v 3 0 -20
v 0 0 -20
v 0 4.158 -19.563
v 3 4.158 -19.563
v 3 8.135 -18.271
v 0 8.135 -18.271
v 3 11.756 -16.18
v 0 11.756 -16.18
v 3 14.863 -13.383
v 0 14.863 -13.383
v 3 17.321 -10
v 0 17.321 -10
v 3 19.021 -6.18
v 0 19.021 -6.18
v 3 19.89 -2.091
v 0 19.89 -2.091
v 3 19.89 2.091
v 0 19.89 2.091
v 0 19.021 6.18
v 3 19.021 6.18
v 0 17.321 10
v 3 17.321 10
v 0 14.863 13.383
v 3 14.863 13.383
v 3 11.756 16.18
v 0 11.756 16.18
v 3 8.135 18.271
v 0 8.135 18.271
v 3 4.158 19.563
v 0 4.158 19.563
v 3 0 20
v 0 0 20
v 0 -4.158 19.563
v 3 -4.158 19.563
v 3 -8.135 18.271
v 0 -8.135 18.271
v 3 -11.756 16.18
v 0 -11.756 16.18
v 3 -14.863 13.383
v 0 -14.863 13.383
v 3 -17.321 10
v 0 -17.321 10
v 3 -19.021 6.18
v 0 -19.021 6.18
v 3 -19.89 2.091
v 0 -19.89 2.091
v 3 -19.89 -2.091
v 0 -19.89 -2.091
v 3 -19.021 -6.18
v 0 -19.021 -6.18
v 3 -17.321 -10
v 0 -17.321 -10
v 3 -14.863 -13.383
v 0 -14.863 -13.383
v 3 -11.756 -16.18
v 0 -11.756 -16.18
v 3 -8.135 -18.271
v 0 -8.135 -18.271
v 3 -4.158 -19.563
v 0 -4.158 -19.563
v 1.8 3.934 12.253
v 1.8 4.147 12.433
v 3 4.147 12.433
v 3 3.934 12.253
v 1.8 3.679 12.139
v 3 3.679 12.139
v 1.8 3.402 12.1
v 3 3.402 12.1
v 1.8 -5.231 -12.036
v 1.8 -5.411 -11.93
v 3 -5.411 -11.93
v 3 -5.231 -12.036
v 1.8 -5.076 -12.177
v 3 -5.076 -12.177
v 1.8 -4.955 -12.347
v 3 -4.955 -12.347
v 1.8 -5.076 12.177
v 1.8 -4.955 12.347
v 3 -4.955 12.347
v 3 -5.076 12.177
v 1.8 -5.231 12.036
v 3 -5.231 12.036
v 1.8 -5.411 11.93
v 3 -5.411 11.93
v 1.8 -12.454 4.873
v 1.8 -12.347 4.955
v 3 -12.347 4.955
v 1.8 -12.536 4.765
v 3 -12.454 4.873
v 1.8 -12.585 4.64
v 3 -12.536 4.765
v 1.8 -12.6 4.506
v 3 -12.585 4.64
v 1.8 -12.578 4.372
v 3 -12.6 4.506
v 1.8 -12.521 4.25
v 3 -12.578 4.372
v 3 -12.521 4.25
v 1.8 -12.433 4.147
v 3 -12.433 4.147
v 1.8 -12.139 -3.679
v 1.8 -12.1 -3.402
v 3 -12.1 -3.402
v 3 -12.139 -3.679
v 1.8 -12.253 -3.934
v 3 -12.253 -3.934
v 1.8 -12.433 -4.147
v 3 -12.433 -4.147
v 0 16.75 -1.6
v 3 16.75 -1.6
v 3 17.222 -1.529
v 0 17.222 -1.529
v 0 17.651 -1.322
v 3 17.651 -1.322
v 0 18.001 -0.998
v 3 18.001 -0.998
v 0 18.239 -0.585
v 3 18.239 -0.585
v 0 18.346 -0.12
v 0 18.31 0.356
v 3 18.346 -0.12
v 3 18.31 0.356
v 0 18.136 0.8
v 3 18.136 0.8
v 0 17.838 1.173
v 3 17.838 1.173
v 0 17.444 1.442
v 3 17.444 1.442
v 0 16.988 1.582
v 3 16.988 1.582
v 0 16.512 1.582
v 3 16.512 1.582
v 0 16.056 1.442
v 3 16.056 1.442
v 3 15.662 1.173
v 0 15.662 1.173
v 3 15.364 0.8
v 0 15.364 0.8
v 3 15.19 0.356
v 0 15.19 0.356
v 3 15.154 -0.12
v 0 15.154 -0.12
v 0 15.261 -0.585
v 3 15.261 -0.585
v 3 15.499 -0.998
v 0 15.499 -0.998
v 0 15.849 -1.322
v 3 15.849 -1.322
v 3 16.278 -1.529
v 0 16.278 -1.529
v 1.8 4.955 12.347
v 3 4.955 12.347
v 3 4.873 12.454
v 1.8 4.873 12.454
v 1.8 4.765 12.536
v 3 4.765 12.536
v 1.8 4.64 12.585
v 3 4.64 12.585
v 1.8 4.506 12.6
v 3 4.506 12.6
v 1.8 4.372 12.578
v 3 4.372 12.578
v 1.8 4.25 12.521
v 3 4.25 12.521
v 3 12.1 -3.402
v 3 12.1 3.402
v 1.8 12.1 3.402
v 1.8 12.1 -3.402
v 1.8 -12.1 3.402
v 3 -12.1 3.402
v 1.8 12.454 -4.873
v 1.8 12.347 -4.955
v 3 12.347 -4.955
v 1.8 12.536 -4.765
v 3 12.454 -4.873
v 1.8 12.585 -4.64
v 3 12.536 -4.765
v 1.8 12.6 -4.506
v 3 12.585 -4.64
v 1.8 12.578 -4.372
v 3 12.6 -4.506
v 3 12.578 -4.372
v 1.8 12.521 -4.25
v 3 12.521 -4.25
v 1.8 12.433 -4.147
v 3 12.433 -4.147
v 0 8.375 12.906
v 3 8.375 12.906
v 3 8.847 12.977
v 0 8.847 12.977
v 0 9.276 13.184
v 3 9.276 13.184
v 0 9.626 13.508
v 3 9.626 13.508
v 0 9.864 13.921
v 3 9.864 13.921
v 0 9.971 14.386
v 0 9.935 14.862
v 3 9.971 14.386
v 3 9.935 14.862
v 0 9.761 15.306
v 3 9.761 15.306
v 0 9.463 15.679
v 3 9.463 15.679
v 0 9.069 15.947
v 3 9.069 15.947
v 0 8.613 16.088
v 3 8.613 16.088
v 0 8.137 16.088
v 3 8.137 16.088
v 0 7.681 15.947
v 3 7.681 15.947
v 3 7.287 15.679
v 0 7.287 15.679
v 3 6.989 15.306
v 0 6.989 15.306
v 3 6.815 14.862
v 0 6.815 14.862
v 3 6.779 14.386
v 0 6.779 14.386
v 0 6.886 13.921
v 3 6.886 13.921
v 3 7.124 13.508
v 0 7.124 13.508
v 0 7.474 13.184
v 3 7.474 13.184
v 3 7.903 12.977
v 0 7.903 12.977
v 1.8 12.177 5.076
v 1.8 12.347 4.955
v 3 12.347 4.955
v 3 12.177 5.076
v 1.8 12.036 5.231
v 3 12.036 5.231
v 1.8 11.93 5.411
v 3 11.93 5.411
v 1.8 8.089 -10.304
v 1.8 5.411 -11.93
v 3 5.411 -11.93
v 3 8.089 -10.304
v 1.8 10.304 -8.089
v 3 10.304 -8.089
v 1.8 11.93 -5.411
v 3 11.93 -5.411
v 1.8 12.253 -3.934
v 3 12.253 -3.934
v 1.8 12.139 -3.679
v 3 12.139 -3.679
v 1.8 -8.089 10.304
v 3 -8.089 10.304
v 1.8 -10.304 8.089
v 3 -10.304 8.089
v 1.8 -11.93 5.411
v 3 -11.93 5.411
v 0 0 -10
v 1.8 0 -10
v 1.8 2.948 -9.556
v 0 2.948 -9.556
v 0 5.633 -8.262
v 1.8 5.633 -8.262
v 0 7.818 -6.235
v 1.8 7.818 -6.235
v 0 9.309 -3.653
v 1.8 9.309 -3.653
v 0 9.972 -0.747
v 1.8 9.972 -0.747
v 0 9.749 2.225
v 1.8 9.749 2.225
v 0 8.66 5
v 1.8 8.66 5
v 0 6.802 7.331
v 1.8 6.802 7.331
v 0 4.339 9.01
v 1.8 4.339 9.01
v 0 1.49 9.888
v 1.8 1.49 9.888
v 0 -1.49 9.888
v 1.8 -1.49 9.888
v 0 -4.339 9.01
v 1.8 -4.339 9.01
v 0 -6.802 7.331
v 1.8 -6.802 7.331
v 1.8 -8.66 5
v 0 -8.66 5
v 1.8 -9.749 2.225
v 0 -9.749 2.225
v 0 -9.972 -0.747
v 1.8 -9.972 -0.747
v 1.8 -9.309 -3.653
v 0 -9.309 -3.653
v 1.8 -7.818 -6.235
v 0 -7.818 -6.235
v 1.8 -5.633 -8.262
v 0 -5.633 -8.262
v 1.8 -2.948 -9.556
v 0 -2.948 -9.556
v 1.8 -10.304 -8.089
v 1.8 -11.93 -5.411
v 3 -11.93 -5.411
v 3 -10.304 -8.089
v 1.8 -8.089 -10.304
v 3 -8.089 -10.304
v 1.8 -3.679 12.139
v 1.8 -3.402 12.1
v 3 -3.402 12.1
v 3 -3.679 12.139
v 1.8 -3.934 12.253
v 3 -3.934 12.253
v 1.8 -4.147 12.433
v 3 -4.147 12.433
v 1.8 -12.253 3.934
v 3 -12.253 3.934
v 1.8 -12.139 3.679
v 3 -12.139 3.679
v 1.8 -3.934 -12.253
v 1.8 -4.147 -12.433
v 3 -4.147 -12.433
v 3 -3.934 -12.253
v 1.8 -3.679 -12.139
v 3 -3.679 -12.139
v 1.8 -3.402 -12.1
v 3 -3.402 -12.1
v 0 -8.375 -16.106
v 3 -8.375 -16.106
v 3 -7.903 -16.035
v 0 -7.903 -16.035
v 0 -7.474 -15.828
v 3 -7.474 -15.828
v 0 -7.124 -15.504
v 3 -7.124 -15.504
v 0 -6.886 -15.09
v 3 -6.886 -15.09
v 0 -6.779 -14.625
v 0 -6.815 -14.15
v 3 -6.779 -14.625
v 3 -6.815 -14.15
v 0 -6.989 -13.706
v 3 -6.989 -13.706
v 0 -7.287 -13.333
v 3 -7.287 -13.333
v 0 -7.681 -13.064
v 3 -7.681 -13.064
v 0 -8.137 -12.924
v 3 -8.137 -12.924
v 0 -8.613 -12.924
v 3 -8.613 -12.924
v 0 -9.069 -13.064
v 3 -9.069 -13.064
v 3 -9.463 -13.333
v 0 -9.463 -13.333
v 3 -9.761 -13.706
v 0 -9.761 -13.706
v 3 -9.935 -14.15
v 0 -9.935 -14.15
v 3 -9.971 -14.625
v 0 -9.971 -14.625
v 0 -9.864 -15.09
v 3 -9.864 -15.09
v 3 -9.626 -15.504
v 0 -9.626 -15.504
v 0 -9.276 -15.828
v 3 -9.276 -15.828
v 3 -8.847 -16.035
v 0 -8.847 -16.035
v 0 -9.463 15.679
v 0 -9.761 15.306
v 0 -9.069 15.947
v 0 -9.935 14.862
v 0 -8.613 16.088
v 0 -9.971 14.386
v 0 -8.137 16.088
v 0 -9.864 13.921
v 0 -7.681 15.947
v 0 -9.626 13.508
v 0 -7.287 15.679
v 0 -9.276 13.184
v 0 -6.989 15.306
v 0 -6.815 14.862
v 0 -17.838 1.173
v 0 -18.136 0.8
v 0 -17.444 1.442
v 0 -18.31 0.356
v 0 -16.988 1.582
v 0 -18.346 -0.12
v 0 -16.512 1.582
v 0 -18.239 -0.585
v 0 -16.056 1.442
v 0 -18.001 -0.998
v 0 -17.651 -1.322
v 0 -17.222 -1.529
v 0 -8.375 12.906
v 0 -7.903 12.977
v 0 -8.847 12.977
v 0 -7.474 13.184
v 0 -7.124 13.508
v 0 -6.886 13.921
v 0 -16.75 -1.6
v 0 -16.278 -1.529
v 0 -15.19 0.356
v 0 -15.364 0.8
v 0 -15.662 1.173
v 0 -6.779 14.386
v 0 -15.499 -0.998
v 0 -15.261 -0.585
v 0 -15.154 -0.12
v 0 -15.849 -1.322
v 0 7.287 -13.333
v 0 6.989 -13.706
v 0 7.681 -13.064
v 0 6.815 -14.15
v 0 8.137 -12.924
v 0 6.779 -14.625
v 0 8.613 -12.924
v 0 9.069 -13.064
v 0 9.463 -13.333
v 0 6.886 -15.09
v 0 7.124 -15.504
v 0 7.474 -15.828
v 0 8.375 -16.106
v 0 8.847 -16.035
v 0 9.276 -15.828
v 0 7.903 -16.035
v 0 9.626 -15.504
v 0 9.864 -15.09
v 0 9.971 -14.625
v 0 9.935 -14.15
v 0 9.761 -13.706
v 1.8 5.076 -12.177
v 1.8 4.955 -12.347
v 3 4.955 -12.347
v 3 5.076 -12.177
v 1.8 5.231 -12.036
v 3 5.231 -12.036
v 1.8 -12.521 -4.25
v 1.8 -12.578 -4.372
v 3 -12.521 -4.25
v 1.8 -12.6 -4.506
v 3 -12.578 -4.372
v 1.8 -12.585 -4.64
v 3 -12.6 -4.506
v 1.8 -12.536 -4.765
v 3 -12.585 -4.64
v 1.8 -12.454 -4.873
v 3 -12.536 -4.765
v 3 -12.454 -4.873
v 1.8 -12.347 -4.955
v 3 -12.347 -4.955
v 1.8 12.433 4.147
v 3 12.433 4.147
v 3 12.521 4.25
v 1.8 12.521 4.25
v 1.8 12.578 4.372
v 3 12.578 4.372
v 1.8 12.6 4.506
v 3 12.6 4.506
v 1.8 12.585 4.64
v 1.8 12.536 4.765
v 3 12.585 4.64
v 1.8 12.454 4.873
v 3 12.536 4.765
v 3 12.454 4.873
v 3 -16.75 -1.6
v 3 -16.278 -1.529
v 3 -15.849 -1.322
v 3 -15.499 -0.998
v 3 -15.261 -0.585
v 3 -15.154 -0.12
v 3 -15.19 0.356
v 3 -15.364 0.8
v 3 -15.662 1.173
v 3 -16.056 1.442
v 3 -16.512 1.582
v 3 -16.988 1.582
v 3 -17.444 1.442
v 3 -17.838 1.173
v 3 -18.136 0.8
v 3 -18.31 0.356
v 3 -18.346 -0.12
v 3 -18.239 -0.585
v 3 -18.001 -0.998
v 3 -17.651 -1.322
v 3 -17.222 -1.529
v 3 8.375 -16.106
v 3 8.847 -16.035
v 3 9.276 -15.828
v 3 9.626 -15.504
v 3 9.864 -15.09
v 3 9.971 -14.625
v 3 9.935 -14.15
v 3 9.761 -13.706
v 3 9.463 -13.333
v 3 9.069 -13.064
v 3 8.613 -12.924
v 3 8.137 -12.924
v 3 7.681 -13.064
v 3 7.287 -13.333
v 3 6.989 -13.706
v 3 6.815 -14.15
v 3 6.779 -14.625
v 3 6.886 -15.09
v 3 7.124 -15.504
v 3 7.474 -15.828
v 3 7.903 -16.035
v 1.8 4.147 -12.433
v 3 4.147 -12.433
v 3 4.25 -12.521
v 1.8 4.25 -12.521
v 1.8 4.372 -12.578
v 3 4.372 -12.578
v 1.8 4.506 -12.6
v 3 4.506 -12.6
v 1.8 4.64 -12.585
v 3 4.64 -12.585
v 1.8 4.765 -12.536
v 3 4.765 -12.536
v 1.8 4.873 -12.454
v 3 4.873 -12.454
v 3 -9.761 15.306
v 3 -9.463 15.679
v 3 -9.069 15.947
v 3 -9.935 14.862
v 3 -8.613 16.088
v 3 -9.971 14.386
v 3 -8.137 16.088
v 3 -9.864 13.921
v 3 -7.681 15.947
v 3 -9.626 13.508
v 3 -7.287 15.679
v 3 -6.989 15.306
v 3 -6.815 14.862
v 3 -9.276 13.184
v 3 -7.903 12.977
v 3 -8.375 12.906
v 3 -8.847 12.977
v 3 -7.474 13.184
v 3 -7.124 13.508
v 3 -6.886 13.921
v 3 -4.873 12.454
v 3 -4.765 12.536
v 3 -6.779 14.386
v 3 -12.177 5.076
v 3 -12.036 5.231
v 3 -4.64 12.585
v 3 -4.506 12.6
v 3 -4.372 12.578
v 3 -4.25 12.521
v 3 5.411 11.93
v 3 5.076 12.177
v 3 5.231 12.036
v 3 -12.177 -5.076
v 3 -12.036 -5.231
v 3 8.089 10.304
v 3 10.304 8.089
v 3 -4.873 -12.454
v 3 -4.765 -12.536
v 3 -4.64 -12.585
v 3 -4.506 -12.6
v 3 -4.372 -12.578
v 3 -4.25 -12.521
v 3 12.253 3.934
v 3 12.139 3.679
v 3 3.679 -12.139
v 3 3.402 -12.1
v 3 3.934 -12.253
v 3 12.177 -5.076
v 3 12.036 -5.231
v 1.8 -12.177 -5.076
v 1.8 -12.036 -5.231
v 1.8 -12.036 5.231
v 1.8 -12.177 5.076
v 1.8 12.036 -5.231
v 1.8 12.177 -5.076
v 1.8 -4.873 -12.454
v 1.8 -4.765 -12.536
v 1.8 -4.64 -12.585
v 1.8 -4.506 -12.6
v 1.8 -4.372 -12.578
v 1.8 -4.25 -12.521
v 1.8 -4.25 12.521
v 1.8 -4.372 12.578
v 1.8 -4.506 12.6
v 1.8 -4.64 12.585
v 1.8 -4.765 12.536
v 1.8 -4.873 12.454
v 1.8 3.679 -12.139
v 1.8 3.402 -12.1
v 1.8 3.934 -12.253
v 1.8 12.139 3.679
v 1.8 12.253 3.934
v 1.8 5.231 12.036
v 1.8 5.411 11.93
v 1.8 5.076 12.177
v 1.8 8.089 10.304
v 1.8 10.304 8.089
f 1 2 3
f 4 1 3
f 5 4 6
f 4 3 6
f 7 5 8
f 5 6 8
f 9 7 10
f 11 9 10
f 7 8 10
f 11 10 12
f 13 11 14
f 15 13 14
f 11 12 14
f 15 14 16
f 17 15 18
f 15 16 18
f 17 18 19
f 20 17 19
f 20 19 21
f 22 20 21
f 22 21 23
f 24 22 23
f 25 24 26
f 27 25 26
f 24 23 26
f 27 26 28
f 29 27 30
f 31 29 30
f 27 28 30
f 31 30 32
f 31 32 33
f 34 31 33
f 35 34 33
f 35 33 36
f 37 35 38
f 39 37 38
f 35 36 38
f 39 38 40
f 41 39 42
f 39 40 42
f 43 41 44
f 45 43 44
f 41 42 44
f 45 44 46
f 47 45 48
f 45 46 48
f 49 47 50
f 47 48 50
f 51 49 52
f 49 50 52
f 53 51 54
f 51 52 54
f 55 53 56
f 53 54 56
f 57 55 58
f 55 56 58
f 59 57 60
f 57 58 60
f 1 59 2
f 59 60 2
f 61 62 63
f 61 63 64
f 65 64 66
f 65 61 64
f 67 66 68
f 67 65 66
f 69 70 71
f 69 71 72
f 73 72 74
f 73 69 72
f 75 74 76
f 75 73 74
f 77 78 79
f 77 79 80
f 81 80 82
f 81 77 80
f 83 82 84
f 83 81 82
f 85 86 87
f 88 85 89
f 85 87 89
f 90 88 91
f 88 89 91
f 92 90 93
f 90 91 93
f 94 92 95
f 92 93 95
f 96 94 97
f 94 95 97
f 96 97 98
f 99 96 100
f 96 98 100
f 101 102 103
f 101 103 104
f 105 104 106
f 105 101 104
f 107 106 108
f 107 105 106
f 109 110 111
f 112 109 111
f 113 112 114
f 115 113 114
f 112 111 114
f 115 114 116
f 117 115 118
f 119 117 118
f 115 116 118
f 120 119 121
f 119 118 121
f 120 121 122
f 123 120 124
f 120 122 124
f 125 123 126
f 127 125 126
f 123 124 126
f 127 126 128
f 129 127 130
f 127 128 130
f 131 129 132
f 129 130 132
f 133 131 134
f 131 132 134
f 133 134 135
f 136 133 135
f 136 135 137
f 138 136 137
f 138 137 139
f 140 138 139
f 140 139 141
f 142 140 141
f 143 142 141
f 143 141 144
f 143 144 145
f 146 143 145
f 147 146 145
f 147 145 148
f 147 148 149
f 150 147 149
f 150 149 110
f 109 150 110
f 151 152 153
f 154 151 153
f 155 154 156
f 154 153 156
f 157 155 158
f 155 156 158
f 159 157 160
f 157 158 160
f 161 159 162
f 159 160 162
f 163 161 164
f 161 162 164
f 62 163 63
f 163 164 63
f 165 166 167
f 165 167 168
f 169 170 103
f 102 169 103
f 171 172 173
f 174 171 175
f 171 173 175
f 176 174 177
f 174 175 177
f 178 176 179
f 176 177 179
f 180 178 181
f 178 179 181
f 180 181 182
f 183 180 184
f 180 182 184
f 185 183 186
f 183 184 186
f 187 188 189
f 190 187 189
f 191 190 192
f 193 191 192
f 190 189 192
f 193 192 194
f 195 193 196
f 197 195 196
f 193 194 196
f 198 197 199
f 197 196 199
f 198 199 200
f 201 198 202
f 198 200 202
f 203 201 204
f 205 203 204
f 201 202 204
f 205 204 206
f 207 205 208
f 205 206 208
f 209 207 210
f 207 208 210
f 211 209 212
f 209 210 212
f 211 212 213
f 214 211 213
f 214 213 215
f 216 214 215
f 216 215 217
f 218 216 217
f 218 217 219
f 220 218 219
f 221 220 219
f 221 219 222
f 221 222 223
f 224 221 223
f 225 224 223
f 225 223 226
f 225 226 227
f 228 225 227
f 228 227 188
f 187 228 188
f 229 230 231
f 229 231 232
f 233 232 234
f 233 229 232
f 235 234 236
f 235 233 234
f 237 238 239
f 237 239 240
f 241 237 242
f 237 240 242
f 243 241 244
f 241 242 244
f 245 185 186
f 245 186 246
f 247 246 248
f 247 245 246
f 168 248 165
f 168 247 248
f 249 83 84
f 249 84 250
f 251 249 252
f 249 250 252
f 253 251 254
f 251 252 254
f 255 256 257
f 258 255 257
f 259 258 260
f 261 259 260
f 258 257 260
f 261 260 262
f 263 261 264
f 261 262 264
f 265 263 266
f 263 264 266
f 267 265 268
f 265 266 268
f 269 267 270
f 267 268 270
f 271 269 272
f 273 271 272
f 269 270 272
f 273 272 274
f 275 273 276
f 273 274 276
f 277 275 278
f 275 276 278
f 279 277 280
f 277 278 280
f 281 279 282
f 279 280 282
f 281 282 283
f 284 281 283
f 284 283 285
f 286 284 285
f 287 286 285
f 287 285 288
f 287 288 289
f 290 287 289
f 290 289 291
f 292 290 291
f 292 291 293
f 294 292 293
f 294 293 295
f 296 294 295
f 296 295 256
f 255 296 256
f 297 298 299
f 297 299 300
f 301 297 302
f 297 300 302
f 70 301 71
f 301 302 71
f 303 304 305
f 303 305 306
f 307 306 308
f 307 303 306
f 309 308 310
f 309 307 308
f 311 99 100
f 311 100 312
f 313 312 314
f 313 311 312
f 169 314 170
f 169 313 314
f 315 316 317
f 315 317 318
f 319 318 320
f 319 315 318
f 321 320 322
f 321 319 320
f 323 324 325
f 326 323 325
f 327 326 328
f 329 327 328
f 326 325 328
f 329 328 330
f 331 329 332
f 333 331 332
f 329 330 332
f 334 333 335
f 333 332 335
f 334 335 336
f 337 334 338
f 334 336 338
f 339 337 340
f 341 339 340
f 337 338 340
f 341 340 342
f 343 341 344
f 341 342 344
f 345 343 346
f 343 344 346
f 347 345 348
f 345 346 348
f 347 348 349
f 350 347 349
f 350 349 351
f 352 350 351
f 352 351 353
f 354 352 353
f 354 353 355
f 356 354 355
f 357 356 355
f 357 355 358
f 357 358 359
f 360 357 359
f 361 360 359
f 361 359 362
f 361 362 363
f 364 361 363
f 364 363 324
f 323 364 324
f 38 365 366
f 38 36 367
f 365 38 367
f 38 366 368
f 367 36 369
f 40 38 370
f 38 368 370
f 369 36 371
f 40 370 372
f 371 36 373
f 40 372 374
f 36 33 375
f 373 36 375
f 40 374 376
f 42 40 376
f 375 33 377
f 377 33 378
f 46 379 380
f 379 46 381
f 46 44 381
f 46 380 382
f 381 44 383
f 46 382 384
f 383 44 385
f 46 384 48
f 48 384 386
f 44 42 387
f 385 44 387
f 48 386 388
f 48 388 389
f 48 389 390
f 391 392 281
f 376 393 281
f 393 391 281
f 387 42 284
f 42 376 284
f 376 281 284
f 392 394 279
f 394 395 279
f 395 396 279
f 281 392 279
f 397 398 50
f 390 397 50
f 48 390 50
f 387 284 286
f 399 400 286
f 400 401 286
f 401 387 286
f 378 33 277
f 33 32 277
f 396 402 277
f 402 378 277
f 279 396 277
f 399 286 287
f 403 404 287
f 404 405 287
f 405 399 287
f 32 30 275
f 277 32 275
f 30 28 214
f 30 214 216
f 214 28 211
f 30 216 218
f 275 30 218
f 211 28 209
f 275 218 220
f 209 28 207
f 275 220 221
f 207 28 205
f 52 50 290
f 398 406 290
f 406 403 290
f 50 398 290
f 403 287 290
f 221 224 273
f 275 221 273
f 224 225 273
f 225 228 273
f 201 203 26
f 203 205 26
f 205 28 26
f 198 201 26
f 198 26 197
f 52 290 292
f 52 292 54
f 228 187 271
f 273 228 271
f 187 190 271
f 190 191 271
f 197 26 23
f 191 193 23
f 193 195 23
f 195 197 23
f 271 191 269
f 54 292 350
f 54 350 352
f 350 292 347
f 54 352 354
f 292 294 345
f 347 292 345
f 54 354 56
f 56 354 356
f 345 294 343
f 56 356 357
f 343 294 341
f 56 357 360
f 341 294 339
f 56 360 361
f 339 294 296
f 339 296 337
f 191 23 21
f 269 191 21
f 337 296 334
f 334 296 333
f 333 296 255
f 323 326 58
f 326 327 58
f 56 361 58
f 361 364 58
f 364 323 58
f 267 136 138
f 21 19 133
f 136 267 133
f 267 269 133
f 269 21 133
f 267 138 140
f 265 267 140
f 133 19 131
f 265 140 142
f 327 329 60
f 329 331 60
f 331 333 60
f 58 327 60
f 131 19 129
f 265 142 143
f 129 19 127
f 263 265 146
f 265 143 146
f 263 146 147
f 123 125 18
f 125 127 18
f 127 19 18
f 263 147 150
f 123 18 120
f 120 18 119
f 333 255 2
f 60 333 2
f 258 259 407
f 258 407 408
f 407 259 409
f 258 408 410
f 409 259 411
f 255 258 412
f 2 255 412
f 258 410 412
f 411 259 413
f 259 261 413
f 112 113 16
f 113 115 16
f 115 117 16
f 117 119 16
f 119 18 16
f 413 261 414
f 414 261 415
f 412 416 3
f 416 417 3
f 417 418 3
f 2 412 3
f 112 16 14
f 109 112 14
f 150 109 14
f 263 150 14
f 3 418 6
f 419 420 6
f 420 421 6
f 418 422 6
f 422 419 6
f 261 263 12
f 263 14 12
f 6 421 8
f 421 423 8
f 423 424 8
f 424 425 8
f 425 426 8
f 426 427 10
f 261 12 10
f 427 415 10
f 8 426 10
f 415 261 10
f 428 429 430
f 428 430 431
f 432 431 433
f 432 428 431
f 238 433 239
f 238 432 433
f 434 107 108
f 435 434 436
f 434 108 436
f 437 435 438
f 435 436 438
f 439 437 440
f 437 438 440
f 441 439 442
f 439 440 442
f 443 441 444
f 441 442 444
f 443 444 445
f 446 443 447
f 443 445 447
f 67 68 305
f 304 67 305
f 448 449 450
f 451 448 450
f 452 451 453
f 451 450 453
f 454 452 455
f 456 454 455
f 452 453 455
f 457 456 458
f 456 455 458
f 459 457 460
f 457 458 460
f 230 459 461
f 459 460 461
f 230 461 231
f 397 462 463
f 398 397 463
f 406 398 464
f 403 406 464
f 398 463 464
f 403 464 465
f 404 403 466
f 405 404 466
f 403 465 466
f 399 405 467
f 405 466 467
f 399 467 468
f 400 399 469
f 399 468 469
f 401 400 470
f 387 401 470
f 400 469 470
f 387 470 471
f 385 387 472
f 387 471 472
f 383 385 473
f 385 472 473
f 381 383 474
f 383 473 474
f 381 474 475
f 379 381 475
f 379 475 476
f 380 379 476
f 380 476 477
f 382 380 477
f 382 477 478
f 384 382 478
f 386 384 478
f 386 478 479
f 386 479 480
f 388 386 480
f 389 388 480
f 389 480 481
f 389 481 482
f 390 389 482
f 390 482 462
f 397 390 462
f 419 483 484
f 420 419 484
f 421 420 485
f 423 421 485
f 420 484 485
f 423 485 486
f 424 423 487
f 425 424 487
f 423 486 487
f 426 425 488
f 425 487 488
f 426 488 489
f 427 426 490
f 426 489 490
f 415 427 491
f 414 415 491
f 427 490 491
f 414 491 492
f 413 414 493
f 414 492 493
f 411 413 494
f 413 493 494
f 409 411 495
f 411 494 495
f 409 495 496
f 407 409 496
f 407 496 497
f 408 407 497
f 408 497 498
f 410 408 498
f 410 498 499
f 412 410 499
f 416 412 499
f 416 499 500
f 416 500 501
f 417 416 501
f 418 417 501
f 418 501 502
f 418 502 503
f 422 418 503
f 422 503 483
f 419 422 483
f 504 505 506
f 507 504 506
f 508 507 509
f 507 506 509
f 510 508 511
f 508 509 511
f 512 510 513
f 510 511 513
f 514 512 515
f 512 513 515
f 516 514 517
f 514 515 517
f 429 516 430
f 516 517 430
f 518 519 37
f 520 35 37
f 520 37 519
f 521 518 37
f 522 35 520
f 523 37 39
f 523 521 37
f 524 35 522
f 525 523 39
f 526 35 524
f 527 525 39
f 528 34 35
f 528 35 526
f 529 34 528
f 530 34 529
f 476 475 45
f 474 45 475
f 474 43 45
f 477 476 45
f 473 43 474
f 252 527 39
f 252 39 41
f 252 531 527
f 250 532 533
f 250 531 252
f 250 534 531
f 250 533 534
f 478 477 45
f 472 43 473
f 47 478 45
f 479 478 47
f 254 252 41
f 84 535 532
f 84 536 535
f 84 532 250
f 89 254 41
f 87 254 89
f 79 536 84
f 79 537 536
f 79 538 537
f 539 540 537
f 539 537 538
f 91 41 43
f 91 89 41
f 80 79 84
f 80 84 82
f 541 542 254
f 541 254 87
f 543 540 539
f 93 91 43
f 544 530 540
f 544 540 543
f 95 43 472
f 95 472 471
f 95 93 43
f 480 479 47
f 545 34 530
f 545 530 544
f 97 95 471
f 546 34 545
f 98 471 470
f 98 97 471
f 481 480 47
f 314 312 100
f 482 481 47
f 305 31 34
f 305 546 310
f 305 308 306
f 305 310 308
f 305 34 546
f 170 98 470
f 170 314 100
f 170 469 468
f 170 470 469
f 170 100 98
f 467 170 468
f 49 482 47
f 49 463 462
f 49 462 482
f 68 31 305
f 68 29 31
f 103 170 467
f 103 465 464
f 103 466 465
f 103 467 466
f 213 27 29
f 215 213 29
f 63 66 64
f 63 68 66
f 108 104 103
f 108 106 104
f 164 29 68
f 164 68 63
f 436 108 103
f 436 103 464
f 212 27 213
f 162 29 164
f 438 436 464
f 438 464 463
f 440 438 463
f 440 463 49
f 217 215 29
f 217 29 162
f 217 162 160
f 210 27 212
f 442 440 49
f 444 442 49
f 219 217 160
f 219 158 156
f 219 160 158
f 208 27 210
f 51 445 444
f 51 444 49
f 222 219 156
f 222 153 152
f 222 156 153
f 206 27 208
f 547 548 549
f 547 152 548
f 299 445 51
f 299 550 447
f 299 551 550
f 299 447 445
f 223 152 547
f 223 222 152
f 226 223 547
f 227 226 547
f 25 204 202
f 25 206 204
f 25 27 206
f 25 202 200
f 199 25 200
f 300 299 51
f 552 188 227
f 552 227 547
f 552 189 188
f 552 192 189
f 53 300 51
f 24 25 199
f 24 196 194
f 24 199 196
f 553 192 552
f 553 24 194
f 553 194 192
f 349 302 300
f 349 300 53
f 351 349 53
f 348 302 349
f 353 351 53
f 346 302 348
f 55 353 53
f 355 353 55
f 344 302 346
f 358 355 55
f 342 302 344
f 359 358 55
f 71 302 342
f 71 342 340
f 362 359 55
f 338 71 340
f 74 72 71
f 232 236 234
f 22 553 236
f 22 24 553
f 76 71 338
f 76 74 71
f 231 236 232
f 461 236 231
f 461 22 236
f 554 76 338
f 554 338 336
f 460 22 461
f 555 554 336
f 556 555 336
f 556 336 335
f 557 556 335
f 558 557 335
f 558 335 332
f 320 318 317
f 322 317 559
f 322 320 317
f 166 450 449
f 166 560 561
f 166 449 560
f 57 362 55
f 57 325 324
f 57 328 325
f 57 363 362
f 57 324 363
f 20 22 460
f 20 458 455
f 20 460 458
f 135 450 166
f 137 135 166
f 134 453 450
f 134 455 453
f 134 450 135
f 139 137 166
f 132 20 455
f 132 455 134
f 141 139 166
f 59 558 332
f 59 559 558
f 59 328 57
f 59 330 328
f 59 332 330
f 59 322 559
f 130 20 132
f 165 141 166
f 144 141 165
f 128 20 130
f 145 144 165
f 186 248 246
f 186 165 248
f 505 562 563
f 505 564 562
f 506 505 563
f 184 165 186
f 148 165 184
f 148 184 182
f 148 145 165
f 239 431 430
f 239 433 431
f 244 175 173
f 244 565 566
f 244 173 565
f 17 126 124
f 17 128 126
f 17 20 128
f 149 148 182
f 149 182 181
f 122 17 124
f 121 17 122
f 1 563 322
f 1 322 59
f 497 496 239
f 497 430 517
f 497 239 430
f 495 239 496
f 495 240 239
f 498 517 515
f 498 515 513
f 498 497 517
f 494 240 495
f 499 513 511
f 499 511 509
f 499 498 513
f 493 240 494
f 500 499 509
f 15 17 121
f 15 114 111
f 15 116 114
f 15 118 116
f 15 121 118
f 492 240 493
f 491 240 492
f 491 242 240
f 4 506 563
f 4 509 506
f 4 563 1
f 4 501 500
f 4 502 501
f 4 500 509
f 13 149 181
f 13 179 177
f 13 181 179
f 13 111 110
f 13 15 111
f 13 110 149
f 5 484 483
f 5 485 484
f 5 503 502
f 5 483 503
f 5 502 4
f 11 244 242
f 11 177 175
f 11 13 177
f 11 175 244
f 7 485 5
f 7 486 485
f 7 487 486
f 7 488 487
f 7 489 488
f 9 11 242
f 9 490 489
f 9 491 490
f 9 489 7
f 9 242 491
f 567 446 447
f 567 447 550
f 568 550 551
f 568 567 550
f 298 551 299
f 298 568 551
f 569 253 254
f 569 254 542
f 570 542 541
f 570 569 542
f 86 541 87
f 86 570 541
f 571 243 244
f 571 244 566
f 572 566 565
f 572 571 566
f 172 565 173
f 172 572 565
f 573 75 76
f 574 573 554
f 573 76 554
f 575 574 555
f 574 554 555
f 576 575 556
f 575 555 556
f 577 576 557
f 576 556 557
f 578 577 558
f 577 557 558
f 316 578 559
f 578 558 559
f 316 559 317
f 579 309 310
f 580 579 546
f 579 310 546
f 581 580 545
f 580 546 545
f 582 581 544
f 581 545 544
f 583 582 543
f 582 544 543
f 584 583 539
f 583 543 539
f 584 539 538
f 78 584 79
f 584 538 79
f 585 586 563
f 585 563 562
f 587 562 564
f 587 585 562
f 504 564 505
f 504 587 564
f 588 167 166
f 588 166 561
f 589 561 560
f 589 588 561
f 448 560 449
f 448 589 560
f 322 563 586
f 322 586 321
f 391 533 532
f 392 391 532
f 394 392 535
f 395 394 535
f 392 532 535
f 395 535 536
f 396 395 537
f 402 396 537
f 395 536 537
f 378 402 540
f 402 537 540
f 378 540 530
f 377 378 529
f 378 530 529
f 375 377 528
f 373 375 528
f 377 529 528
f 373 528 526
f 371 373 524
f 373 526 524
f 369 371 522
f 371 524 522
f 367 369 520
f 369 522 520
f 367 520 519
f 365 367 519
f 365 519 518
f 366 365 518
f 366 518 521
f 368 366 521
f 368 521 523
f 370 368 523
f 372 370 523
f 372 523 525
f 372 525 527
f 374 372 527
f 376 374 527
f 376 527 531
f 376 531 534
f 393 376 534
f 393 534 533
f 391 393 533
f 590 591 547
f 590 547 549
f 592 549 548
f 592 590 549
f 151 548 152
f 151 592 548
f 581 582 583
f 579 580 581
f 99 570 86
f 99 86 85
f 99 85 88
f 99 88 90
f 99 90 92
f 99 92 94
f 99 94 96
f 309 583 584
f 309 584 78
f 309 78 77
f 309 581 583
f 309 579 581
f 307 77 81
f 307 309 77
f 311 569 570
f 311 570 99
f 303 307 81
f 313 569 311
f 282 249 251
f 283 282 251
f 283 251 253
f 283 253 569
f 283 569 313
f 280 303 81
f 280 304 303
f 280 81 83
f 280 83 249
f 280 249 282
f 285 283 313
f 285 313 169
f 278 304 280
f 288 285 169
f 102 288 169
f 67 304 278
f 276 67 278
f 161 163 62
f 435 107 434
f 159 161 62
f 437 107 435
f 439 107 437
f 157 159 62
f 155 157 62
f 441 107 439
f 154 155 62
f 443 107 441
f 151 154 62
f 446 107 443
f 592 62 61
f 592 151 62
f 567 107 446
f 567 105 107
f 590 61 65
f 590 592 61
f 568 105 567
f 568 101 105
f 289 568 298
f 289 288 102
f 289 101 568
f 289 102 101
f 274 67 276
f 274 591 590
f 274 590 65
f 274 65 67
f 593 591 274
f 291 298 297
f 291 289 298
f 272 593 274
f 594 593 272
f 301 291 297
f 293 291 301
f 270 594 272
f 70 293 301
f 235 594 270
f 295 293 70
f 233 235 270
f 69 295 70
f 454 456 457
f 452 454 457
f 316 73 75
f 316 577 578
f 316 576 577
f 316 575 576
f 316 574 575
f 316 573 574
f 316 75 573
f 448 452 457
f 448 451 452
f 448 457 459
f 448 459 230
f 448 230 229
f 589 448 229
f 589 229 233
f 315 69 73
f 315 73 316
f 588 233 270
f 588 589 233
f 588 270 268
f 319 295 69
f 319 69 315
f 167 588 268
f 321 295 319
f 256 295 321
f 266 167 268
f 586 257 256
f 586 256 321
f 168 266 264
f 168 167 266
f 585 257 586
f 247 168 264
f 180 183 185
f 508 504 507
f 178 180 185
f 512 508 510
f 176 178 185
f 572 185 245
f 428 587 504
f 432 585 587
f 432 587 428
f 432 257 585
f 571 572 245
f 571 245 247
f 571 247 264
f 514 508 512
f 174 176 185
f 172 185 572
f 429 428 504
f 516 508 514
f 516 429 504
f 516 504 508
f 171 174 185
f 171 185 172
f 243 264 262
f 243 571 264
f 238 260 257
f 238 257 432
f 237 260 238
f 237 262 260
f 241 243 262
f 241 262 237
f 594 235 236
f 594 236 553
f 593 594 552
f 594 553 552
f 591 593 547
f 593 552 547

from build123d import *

# Parameters (mm, degrees)
SKETCH_3_R          = 20
EXTRUDE_3_DEPTH     = 3
SKETCH_4_R          = 13.1
CUT_EXTRUDE_1_DEPTH = 1.2
EXTRUDE_START       = 1.2
EXTRUDE_4_DEPTH     = 1.2
SKETCH_6_R          = 10
CUT_EXTRUDE_2_DEPTH = 29.341489022
SKETCH_7_R          = 1.6
CUT_EXTRUDE_4_DEPTH = 29.442925307
SKETCH_8_R          = 0.5
CUT_EXTRUDE_5_DEPTH = 1.2
FILLET_START        = 1.8
FILLET_1_DEPTH      = 2.2


with BuildPart() as part:
    # 草图3 → 凸台-拉伸3 (new body)
    with BuildSketch(Plane(origin=(0, 0, 0), x_dir=(0, 0, -1), z_dir=(1, 0, 0))):
        Circle(SKETCH_3_R)
    extrude(amount=EXTRUDE_3_DEPTH)

    # 草图4 → 切除-拉伸1 (cut)
    with BuildSketch(Plane(origin=(3, 0, 0), x_dir=(0, 0, -1), z_dir=(1, 0, 0))):
        Circle(SKETCH_4_R)
    extrude(amount=-CUT_EXTRUDE_1_DEPTH, mode=Mode.SUBTRACT)

    # 草图5 → 凸台-拉伸4 (add)
    with BuildSketch(Plane(origin=(1.8, 0, 0), x_dir=(0, 0, -1), z_dir=(1, 0, 0)).offset(EXTRUDE_START)):
        with BuildLine():
            Line((-5.019960159, 12.1), (5.019960159, 12.1))
            ThreePointArc((5.019960159, 12.1), (0, 13.1), (-5.019960159, 12.1))
        make_face()
        with BuildLine():
            Line((-12.1, 5.019960159), (-12.1, -5.019960159))
            ThreePointArc((-12.1, -5.019960159), (-13.1, 0), (-12.1, 5.019960159))
        make_face()
        with BuildLine():
            Line((-5.019960159, -12.1), (5.019960159, -12.1))
            ThreePointArc((5.019960159, -12.1), (0, -13.1), (-5.019960159, -12.1))
        make_face()
        with BuildLine():
            Line((12.1, 5.019960159), (12.1, -5.019960159))
            ThreePointArc((12.1, -5.019960159), (13.1, 0), (12.1, 5.019960159))
        make_face()
    extrude(amount=-EXTRUDE_4_DEPTH)

    # 草图6 → 切除-拉伸2 (cut, through all)
    with BuildSketch(Plane(origin=(1.8, 0, 0), x_dir=(0, 0, -1), z_dir=(1, 0, 0))):
        Circle(SKETCH_6_R)
    extrude(amount=-CUT_EXTRUDE_2_DEPTH, mode=Mode.SUBTRACT)

    # 草图7 → 切除-拉伸4 (cut, through all)
    with BuildSketch(Plane(origin=(3, 0, 0), x_dir=(0, 0, -1), z_dir=(1, 0, 0))):
        with Locations((0, 16.75)):
            Circle(SKETCH_7_R)
        with Locations((14.505925513, 8.375)):
            Circle(SKETCH_7_R)
        with Locations((14.505925513, -8.375)):
            Circle(SKETCH_7_R)
        with Locations((0, -16.75)):
            Circle(SKETCH_7_R)
        with Locations((-14.505925513, -8.375)):
            Circle(SKETCH_7_R)
        with Locations((-14.505925513, 8.375)):
            Circle(SKETCH_7_R)
    extrude(amount=-CUT_EXTRUDE_4_DEPTH, mode=Mode.SUBTRACT)

    # 草图8 → 切除-拉伸5 (cut)
    with BuildSketch(Plane(origin=(3, 0, 0), x_dir=(0, 0, -1), z_dir=(1, 0, 0))):
        with Locations((-4.519960159, 12.1)):
            Circle(SKETCH_8_R)
        with Locations((12.1, 4.519960159)):
            Circle(SKETCH_8_R)
        with Locations((4.519960159, -12.1)):
            Circle(SKETCH_8_R)
        with Locations((-12.1, -4.519960159)):
            Circle(SKETCH_8_R)
        with Locations((4.519960159, 12.1)):
            Circle(SKETCH_8_R)
        with Locations((12.1, -4.519960159)):
            Circle(SKETCH_8_R)
        with Locations((-4.519960159, -12.1)):
            Circle(SKETCH_8_R)
        with Locations((-12.1, 4.519960159)):
            Circle(SKETCH_8_R)
    extrude(amount=-CUT_EXTRUDE_5_DEPTH, mode=Mode.SUBTRACT)

    # 圆角1: read off the stored shape, not the designer's step
    # 圆角1 outline → 圆角1 (cut)
    with BuildSketch(Plane.YZ.offset(FILLET_START)):
        with BuildLine():
            ThreePointArc((3.40192617, -12.1), (3.810174461, -12.187129071), (4.147282163, -12.433333333))
            ThreePointArc((4.147282163, -12.433333333), (4.05287398, -12.278411045), (4.019960159, -12.1))
            Line((4.019960159, -12.1), (3.40192617, -12.1))
        make_face()
        with BuildLine():
            ThreePointArc((5.019960159, -12.1), (5.003372821, -12.227719215), (4.954711368, -12.346964343))
            ThreePointArc((4.954711368, -12.346964343), (5.149921864, -12.102428131), (5.411148977, -11.930191396))
            ThreePointArc((5.411148977, -11.930191396), (5.216245603, -12.016687639), (5.019960159, -12.1))
        make_face()
        with BuildLine():
            ThreePointArc((-4.147282163, -12.433333333), (-3.810174461, -12.187129071), (-3.40192617, -12.1))
            Line((-3.40192617, -12.1), (-4.019960159, -12.1))
            ThreePointArc((-4.019960159, -12.1), (-4.05287398, -12.278411045), (-4.147282163, -12.433333333))
        make_face()
        with BuildLine():
            ThreePointArc((12.1, -5.019960159), (12.016687639, -5.216245603), (11.930191396, -5.411148977))
            ThreePointArc((11.930191396, -5.411148977), (12.102428131, -5.149921864), (12.346964343, -4.954711368))
            ThreePointArc((12.346964343, -4.954711368), (12.227719215, -5.003372821), (12.1, -5.019960159))
        make_face()
        with BuildLine():
            ThreePointArc((-5.411148977, -11.930191396), (-5.149921864, -12.102428131), (-4.954711368, -12.346964343))
            ThreePointArc((-4.954711368, -12.346964343), (-5.003372821, -12.227719215), (-5.019960159, -12.1))
            ThreePointArc((-5.019960159, -12.1), (-5.216245603, -12.016687639), (-5.411148977, -11.930191396))
        make_face()
        with BuildLine():
            ThreePointArc((12.1, -4.019960159), (12.278411045, -4.05287398), (12.433333333, -4.147282163))
            ThreePointArc((12.433333333, -4.147282163), (12.187129071, -3.810174461), (12.1, -3.40192617))
            Line((12.1, -3.40192617), (12.1, -4.019960159))
        make_face()
        with BuildLine():
            ThreePointArc((-12.346964343, -4.954711368), (-12.102428131, -5.149921864), (-11.930191396, -5.411148977))
            ThreePointArc((-11.930191396, -5.411148977), (-12.016687639, -5.216245603), (-12.1, -5.019960159))
            ThreePointArc((-12.1, -5.019960159), (-12.227719215, -5.003372821), (-12.346964343, -4.954711368))
        make_face()
        with BuildLine():
            Line((12.1, 4.019960159), (12.1, 3.40192617))
            ThreePointArc((12.1, 3.40192617), (12.187129071, 3.810174461), (12.433333333, 4.147282163))
            ThreePointArc((12.433333333, 4.147282163), (12.278411045, 4.05287398), (12.1, 4.019960159))
        make_face()
        with BuildLine():
            ThreePointArc((-12.1, -3.40192617), (-12.187129071, -3.810174461), (-12.433333333, -4.147282163))
            ThreePointArc((-12.433333333, -4.147282163), (-12.278411045, -4.05287398), (-12.1, -4.019960159))
            Line((-12.1, -4.019960159), (-12.1, -3.40192617))
        make_face()
        with BuildLine():
            ThreePointArc((12.1, 5.019960159), (12.227719215, 5.003372821), (12.346964343, 4.954711368))
            ThreePointArc((12.346964343, 4.954711368), (12.102428131, 5.149921864), (11.930191396, 5.411148977))
            ThreePointArc((11.930191396, 5.411148977), (12.016687639, 5.216245603), (12.1, 5.019960159))
        make_face()
        with BuildLine():
            ThreePointArc((-12.433333333, 4.147282163), (-12.187129071, 3.810174461), (-12.1, 3.40192617))
            Line((-12.1, 3.40192617), (-12.1, 4.019960159))
            ThreePointArc((-12.1, 4.019960159), (-12.278411045, 4.05287398), (-12.433333333, 4.147282163))
        make_face()
        with BuildLine():
            ThreePointArc((5.019960159, 12.1), (5.216245603, 12.016687639), (5.411148977, 11.930191396))
            ThreePointArc((5.411148977, 11.930191396), (5.149921864, 12.102428131), (4.954711368, 12.346964343))
            ThreePointArc((4.954711368, 12.346964343), (5.003372821, 12.227719215), (5.019960159, 12.1))
        make_face()
        with BuildLine():
            ThreePointArc((-11.930191396, 5.411148977), (-12.102428131, 5.149921864), (-12.346964343, 4.954711368))
            ThreePointArc((-12.346964343, 4.954711368), (-12.227719215, 5.003372821), (-12.1, 5.019960159))
            ThreePointArc((-12.1, 5.019960159), (-12.016687639, 5.216245603), (-11.930191396, 5.411148977))
        make_face()
        with BuildLine():
            ThreePointArc((4.019960159, 12.1), (4.05287398, 12.278411045), (4.147282163, 12.433333333))
            ThreePointArc((4.147282163, 12.433333333), (3.810174461, 12.187129071), (3.40192617, 12.1))
            Line((3.40192617, 12.1), (4.019960159, 12.1))
        make_face()
        with BuildLine():
            ThreePointArc((-4.954711368, 12.346964343), (-5.149921864, 12.102428131), (-5.411148977, 11.930191396))
            ThreePointArc((-5.411148977, 11.930191396), (-5.216245603, 12.016687639), (-5.019960159, 12.1))
            ThreePointArc((-5.019960159, 12.1), (-5.003372821, 12.227719215), (-4.954711368, 12.346964343))
        make_face()
        with BuildLine():
            Line((-4.019960159, 12.1), (-3.40192617, 12.1))
            ThreePointArc((-3.40192617, 12.1), (-3.810174461, 12.187129071), (-4.147282163, 12.433333333))
            ThreePointArc((-4.147282163, 12.433333333), (-4.05287398, 12.278411045), (-4.019960159, 12.1))
        make_face()
    extrude(amount=FILLET_1_DEPTH, mode=Mode.SUBTRACT)


solid = part.part
